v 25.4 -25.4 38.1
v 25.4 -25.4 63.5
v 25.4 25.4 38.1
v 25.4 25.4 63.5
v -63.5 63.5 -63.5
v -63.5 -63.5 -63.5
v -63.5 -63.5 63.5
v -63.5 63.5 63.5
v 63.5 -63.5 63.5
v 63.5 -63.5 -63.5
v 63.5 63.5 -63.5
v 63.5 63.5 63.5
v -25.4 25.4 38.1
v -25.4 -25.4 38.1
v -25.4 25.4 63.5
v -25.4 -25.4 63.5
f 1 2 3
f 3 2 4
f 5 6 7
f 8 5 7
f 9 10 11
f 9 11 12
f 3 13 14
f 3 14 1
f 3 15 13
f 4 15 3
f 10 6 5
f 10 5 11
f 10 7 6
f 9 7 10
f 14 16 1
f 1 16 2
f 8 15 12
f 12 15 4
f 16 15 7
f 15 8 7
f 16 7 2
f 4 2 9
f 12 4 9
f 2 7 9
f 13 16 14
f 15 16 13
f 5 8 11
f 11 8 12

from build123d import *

# Parameters (mm, degrees)
F0_W     = 127
F0_H     = 127
F1_DEPTH = 63.5
F2_W     = 50.8
F2_H     = 50.8
F3_DEPTH = 25.4


with BuildPart() as f1:
    # F0 (on Front) → F1 (new body, symmetric)
    with BuildSketch(Plane.XZ):
        Rectangle(F0_W, F0_H)
    extrude(amount=F1_DEPTH, both=True)

    # F2 (on face) → F3 (cut)
    with BuildSketch(Plane.XY.offset(63.5)):
        Rectangle(F2_W, F2_H)
    extrude(amount=-F3_DEPTH, mode=Mode.SUBTRACT)


solid = f1.part
